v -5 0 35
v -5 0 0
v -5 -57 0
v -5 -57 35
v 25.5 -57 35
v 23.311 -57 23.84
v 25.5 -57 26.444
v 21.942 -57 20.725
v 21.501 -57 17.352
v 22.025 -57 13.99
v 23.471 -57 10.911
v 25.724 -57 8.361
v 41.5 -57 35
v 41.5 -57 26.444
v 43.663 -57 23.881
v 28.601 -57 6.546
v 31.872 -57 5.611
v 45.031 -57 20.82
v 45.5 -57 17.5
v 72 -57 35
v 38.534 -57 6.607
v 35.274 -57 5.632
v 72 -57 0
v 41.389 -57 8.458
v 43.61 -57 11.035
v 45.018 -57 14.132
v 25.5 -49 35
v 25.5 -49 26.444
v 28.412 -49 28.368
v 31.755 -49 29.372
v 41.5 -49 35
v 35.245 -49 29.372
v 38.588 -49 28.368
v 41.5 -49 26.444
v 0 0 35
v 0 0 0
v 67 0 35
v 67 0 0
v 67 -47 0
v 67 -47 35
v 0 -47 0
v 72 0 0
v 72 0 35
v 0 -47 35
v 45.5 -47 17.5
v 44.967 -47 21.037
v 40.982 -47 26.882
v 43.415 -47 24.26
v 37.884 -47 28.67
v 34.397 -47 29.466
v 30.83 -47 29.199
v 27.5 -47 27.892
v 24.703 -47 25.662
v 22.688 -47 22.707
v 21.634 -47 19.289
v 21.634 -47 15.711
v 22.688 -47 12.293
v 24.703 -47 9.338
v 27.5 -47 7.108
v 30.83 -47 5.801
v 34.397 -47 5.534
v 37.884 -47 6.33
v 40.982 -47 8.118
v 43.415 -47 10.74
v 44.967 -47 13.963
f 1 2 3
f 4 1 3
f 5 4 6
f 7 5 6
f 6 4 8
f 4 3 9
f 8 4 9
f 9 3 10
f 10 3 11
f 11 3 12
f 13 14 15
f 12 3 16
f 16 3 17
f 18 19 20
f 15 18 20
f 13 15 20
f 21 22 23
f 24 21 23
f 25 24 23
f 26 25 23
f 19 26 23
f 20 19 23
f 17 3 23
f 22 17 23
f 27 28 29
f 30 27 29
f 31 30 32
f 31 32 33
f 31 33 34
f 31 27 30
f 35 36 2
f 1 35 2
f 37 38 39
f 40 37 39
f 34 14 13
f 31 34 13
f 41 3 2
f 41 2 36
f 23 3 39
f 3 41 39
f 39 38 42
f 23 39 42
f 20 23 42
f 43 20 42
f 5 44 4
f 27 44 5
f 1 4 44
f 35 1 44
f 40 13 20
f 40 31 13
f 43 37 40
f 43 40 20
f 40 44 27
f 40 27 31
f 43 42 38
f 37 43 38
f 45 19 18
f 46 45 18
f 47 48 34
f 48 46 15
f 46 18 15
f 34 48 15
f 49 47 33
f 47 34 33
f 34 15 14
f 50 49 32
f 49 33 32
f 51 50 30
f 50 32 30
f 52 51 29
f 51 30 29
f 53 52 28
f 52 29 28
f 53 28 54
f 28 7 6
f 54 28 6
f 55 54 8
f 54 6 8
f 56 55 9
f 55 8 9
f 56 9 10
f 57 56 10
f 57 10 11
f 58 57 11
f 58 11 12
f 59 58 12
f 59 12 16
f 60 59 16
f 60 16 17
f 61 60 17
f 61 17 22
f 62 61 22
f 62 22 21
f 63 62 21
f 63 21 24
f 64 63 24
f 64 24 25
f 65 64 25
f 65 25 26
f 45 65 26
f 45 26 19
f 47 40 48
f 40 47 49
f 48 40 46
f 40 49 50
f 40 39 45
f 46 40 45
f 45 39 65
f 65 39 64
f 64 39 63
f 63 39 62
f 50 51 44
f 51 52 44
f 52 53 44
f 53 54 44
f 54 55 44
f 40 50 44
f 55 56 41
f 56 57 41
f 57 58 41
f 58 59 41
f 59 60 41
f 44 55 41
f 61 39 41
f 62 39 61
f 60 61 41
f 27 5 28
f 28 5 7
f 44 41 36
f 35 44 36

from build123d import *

# Parameters (mm, degrees)
EXTRUSION1_DEPTH = 35
ESQUISSE2_R      = 12
EXTRUSION2_DEPTH = 58
EXTRUSION3_DEPTH = 8


with BuildPart() as part:
    # Esquisse1 → Extrusion1 (new body)
    with BuildSketch(Plane.XY):
        Polygon((72, -57), (72, 0), (67, 0), (67, -47), (0, -47), (0, 0), (-5, 0), (-5, -57), align=None)
    extrude(amount=EXTRUSION1_DEPTH)

    # Esquisse2 → Extrusion2 (cut, through all)
    with BuildSketch(Plane.XZ.offset(57)):
        with Locations((33.5, 17.5)):
            Circle(ESQUISSE2_R)
    extrude(amount=-EXTRUSION2_DEPTH, mode=Mode.SUBTRACT)

    # Esquisse3 → Extrusion3 (cut)
    with BuildSketch(Plane.XZ.offset(57)):
        with BuildLine():
            Line((41.5, 26.44427191), (41.5, 35))
            Line((41.5, 35), (25.5, 35))
            Line((25.5, 35), (25.5, 26.44427191))
            ThreePointArc((25.5, 26.44427191), (33.5, 29.5), (41.5, 26.44427191))
        make_face()
    extrude(amount=-EXTRUSION3_DEPTH, mode=Mode.SUBTRACT)


solid = part.part
